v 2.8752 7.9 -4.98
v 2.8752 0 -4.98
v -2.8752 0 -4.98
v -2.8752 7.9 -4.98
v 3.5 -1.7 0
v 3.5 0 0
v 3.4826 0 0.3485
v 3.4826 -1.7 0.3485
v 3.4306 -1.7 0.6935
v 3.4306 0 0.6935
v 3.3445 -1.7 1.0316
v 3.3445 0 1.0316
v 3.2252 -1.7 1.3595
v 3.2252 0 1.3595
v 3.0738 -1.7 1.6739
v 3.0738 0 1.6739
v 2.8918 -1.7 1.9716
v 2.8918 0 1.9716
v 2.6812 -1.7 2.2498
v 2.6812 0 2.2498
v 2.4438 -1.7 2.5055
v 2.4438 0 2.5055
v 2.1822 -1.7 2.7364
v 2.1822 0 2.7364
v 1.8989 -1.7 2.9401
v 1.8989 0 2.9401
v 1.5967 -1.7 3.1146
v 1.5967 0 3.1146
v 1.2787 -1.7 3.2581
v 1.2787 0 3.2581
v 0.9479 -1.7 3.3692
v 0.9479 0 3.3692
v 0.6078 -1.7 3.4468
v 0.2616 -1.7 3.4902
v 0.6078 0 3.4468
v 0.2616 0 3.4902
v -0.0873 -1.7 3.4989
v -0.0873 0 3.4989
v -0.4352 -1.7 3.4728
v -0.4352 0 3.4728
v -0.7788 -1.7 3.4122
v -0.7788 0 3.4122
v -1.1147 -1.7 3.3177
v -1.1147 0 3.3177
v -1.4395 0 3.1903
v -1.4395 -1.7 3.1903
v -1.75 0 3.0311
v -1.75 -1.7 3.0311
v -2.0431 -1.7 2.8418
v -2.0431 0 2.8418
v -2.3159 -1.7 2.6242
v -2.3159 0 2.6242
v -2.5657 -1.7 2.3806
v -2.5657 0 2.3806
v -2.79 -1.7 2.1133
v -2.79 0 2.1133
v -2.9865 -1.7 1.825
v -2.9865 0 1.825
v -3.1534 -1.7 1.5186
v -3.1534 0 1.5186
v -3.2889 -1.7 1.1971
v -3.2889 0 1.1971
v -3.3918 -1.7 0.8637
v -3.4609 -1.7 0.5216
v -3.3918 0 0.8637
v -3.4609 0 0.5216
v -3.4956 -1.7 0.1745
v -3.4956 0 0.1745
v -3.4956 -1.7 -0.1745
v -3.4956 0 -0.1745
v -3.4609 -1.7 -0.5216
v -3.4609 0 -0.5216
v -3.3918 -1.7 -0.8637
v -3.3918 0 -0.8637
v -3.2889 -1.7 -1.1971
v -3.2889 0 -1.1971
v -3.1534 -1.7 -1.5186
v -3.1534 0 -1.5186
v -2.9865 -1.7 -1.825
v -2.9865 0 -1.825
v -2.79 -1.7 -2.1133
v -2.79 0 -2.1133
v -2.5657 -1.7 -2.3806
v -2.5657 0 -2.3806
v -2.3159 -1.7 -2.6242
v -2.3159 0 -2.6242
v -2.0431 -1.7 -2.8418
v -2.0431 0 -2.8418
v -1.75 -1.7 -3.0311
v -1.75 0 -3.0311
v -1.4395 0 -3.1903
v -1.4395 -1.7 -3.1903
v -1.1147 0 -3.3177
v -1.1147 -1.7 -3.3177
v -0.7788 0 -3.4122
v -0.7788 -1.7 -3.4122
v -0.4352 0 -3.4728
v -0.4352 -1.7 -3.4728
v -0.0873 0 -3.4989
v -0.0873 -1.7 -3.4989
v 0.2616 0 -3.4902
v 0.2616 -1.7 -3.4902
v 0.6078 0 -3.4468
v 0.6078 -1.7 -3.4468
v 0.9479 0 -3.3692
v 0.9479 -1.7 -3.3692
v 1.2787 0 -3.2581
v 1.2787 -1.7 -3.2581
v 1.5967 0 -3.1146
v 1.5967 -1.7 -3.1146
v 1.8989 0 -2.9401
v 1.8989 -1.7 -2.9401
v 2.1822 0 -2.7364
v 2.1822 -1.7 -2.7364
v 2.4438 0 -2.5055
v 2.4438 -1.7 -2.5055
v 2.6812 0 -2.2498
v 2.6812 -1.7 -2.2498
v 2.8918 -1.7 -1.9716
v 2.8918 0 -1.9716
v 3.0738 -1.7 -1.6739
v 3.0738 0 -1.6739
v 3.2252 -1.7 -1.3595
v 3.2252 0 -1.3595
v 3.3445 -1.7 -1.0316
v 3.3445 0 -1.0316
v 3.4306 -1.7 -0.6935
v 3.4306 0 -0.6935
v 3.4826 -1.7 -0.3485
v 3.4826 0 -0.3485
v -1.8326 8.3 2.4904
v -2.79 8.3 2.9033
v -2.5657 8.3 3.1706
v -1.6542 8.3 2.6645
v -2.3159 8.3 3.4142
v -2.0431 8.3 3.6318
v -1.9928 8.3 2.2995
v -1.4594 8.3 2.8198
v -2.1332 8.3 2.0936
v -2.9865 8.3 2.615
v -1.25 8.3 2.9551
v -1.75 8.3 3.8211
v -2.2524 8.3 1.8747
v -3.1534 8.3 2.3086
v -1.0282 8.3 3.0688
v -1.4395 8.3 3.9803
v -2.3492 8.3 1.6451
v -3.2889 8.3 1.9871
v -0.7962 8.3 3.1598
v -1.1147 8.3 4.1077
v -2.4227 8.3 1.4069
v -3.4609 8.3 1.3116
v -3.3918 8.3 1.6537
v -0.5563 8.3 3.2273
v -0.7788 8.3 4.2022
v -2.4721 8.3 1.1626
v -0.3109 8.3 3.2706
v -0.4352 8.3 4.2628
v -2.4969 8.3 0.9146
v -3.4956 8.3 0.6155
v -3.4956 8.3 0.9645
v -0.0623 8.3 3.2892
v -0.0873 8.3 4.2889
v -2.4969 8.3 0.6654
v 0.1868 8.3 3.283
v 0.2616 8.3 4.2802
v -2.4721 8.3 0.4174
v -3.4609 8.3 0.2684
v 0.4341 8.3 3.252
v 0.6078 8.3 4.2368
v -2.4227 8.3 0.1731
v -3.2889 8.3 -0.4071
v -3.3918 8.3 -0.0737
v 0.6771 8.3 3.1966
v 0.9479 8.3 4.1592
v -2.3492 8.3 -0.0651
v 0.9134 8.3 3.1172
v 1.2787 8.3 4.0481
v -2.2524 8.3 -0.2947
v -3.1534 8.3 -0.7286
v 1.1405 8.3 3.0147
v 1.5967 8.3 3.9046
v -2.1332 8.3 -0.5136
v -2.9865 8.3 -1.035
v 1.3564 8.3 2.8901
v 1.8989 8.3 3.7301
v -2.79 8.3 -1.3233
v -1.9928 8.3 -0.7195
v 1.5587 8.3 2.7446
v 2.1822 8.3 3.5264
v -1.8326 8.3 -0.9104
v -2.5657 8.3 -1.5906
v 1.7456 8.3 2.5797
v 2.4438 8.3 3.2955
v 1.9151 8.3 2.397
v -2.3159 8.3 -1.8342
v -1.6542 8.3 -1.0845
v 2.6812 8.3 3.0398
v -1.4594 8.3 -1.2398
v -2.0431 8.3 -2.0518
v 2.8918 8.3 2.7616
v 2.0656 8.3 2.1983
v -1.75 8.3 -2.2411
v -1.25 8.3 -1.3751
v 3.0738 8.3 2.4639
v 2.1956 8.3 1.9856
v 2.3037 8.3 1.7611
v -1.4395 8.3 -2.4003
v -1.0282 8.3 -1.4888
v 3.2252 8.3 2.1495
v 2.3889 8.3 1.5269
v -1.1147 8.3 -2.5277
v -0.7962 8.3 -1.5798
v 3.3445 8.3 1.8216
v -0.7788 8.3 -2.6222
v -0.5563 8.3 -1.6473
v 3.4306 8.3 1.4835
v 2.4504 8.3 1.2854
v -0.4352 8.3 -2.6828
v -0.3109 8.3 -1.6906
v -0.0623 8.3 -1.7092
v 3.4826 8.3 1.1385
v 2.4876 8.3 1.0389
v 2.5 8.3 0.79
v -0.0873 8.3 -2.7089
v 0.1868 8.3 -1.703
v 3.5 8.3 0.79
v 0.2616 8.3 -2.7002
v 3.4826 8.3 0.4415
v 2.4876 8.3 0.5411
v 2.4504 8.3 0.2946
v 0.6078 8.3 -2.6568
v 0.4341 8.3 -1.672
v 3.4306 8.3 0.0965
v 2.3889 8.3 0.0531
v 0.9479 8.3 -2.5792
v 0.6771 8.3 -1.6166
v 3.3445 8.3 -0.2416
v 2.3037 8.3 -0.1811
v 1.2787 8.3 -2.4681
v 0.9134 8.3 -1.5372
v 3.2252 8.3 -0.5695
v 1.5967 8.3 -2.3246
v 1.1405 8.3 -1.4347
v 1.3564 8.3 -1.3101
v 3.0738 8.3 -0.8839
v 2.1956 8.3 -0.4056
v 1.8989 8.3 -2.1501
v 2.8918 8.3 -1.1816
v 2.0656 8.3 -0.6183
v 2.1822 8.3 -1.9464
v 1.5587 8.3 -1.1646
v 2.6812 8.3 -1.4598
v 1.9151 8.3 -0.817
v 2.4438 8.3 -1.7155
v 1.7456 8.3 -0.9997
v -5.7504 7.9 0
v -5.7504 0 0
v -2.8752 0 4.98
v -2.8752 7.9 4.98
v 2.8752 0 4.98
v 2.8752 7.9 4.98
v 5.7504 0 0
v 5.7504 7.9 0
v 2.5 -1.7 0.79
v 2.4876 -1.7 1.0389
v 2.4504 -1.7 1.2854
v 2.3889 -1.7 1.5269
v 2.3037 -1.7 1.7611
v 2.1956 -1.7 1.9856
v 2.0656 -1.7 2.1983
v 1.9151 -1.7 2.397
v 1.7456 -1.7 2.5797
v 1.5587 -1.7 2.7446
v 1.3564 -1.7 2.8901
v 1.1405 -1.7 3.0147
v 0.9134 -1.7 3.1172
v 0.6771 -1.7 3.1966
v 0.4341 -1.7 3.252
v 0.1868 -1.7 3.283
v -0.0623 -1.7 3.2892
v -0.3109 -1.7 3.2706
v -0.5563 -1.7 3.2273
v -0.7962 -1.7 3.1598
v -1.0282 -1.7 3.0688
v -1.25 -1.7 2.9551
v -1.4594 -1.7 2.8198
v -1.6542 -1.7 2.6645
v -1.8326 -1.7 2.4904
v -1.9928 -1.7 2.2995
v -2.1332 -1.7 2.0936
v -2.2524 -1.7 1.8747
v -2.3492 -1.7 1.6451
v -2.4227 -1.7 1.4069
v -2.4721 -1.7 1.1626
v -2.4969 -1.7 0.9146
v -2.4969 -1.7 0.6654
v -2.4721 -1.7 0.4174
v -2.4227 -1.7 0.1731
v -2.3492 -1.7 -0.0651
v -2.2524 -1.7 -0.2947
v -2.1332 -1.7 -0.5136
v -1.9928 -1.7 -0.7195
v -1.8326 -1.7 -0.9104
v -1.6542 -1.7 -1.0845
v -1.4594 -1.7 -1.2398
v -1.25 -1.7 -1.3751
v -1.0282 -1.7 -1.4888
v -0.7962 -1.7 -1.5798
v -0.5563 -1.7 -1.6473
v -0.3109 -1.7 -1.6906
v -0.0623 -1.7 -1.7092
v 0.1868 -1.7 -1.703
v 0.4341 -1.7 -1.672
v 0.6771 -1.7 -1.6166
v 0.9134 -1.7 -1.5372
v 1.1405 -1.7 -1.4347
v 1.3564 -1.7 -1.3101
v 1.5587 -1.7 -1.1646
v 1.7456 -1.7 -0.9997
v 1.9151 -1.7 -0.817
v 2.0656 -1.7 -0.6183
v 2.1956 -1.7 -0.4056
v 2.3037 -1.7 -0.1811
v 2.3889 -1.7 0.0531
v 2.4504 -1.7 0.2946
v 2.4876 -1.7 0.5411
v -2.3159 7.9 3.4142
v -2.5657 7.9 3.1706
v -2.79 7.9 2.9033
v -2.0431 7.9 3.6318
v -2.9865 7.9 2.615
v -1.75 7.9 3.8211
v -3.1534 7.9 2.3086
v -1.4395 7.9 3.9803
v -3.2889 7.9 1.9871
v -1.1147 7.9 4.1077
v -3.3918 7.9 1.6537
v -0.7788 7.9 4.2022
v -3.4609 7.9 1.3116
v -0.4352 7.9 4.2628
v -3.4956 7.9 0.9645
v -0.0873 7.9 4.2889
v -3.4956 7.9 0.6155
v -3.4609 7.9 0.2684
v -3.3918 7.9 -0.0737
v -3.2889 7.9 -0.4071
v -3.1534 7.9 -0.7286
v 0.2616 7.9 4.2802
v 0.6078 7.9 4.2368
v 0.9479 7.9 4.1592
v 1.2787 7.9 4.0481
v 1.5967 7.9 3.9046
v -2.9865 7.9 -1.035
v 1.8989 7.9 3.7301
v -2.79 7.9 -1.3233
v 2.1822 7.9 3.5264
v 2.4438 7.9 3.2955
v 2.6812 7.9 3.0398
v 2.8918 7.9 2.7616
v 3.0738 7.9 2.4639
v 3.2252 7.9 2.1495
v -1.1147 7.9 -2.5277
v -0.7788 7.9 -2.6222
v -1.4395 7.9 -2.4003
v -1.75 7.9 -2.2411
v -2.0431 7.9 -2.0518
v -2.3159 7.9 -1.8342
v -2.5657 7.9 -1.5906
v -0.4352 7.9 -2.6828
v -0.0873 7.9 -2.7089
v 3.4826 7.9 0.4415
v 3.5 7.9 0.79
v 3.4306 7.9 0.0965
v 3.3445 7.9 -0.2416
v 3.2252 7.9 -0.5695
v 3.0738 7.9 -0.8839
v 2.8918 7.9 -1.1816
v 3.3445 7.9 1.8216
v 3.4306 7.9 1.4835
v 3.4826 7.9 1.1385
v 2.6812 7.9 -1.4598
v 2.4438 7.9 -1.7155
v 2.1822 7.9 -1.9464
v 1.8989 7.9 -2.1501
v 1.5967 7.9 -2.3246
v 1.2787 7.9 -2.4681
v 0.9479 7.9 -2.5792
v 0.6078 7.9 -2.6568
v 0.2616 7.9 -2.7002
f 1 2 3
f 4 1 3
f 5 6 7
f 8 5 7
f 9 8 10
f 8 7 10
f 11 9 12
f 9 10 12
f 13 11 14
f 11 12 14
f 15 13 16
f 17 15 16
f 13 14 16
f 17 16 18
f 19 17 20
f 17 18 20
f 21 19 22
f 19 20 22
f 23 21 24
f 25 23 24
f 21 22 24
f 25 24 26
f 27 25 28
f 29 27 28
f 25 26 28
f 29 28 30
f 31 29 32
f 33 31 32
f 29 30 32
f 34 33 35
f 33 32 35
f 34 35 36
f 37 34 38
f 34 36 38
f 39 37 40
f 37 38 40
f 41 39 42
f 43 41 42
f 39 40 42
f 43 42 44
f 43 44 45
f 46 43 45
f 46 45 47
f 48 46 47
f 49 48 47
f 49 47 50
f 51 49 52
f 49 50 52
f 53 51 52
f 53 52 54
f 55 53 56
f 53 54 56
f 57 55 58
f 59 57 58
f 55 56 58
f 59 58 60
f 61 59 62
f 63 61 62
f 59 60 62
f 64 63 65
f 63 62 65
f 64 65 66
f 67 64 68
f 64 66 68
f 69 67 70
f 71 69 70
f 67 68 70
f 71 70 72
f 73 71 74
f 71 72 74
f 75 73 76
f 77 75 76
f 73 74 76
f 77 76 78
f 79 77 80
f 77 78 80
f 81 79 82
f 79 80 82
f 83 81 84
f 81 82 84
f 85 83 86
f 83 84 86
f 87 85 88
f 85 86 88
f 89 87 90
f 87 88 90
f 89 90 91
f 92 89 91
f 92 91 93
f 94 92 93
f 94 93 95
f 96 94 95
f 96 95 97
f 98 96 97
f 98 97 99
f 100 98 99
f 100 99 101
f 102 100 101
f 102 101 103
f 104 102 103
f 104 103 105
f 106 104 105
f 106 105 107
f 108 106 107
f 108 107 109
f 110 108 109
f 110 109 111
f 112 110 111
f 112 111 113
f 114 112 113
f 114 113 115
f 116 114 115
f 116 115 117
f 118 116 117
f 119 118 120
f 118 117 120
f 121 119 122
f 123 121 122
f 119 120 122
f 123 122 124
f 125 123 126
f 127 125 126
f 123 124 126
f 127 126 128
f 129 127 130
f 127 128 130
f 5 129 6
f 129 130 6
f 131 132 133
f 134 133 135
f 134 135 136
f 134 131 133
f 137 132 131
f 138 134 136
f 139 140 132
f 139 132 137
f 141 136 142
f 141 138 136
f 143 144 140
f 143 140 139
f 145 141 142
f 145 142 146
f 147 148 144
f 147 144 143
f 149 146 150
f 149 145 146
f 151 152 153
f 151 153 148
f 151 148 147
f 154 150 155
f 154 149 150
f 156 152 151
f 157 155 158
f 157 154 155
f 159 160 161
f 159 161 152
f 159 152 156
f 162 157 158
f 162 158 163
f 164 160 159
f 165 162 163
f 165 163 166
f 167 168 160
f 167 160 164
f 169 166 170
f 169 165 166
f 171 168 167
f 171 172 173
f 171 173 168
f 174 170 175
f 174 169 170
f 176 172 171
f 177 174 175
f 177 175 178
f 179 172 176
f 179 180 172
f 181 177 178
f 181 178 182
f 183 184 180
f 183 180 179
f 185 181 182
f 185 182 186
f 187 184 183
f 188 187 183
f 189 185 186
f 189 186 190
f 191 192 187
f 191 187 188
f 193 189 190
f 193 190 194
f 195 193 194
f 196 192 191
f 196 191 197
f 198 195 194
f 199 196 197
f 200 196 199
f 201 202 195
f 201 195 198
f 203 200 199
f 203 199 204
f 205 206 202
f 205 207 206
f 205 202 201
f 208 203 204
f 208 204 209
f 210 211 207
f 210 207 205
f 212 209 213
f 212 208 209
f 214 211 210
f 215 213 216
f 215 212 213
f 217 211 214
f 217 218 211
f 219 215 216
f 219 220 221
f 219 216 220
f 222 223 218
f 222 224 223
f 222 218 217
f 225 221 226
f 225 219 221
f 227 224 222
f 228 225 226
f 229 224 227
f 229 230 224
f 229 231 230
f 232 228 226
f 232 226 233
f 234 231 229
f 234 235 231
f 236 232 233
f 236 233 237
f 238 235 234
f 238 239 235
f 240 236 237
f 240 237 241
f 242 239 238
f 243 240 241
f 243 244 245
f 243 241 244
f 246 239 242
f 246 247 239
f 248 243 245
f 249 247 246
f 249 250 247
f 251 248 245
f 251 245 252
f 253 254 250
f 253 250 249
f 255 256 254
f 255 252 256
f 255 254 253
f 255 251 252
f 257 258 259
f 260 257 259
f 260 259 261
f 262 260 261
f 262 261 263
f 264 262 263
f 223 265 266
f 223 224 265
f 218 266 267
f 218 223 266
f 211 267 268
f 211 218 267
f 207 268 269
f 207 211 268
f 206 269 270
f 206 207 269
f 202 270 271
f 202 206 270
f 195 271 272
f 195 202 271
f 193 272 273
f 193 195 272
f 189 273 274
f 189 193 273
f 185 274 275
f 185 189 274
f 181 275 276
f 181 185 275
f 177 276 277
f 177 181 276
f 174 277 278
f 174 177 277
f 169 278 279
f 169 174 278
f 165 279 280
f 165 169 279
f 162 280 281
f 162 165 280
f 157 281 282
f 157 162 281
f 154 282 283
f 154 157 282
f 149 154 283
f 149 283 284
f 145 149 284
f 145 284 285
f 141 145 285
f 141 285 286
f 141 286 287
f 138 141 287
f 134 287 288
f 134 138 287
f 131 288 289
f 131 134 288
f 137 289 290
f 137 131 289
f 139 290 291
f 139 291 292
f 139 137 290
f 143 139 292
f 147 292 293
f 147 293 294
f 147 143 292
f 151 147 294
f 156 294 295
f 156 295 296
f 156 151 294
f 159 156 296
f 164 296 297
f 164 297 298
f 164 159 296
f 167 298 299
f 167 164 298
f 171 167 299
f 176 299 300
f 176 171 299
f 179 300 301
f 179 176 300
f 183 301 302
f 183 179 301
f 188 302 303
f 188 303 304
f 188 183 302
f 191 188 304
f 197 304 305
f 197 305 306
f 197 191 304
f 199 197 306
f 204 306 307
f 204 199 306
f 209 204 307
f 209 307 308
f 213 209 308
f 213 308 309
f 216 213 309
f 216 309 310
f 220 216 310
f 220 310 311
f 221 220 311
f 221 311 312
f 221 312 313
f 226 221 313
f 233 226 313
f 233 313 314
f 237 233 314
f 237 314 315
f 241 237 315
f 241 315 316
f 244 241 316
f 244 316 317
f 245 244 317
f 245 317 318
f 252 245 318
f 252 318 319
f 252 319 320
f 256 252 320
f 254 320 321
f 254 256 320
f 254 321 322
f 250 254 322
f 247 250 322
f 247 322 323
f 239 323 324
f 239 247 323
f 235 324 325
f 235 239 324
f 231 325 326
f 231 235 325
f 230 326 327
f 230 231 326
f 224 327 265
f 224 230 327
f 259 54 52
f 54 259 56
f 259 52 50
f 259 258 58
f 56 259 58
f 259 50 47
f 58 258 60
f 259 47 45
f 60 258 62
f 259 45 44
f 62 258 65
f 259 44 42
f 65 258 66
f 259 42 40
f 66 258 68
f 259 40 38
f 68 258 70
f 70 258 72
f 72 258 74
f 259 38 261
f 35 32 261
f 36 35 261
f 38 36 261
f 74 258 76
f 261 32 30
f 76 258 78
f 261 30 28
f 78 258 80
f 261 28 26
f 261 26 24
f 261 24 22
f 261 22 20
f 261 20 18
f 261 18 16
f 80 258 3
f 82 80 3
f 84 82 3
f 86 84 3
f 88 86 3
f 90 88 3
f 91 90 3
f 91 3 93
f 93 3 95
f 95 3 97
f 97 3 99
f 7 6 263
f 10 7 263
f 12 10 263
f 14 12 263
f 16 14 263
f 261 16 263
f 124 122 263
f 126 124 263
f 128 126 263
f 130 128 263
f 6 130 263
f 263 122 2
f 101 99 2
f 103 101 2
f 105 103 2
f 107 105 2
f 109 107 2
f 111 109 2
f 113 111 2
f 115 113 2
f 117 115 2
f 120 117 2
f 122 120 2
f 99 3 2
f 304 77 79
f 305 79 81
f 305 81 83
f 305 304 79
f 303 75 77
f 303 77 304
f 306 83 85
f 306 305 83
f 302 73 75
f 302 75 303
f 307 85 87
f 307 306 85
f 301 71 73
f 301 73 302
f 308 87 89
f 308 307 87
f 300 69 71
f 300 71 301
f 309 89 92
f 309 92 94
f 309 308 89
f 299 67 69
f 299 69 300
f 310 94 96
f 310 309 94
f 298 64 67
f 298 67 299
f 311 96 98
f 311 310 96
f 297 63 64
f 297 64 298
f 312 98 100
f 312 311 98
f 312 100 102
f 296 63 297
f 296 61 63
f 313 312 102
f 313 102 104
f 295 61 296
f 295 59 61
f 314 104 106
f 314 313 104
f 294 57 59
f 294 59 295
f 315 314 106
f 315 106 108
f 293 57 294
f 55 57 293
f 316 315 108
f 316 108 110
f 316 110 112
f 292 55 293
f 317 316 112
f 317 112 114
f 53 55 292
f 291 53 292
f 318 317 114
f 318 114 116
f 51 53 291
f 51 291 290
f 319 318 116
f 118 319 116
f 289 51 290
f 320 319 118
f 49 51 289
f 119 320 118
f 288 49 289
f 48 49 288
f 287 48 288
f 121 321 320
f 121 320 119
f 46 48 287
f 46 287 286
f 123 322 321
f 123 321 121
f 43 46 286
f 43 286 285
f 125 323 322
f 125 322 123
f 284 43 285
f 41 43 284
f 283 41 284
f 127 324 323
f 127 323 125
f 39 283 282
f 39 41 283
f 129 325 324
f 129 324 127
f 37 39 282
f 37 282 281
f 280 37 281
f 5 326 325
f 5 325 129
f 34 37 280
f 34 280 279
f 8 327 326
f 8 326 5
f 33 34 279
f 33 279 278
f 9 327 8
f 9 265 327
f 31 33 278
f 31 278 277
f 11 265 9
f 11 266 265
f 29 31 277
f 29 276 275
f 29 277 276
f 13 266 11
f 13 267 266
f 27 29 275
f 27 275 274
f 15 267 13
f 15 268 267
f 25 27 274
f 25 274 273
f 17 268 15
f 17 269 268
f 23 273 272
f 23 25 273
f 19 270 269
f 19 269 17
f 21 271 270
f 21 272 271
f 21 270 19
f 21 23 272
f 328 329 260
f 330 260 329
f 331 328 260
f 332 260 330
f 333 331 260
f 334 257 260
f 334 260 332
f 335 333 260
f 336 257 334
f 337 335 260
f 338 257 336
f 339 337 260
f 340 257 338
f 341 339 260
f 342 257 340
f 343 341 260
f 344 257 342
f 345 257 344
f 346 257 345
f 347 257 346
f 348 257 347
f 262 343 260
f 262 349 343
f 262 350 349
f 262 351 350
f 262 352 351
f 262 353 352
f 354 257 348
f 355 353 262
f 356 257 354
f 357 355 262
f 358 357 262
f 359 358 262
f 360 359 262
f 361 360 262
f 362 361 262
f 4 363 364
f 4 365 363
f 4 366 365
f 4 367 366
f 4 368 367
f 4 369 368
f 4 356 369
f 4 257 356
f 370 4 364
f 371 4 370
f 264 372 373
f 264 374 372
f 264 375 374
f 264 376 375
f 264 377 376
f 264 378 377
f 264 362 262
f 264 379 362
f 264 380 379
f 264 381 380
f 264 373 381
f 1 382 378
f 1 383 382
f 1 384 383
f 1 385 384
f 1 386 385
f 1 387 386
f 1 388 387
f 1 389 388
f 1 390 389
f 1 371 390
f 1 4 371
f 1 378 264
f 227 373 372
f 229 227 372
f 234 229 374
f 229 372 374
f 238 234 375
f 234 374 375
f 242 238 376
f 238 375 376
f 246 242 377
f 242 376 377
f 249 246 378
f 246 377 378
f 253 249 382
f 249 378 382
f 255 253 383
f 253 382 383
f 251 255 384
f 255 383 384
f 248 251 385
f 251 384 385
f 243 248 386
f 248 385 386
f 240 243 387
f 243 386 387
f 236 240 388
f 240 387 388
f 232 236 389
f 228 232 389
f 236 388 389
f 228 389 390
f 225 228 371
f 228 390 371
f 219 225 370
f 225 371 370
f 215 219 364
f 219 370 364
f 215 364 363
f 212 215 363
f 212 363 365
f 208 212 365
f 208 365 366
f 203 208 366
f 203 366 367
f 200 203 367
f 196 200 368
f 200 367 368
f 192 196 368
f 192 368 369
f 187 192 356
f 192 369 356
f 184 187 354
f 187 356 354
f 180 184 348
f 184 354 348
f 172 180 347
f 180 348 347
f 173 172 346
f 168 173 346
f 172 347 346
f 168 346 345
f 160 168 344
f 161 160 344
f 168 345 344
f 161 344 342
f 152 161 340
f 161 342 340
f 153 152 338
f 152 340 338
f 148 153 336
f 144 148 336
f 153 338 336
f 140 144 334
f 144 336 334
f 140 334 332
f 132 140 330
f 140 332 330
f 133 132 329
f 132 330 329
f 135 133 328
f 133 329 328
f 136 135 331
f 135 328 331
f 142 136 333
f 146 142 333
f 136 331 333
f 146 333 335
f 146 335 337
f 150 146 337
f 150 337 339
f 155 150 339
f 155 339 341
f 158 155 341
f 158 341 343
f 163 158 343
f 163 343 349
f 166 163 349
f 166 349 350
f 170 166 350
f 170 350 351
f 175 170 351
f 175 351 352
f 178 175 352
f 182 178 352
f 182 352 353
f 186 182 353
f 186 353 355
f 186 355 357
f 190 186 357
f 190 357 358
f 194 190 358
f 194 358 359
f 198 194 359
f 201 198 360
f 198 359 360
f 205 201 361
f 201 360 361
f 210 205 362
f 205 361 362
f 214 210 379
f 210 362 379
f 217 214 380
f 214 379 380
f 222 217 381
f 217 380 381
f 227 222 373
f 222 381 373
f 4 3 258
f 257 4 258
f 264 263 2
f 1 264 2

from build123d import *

# Parameters (mm, degrees)
BOSS_EXTRUDE1_DEPTH = 7.9
SKETCH4_R           = 2.5
CUT_EXTRUDE1_DEPTH  = 8.9
SKETCH_1_R          = 3.5
SKETCH_1_R_2        = 2.5
EXTRUDE_1_DEPTH     = 0.4
SKETCH_2_R          = 3.5
SKETCH_2_R_2        = 2.5
EXTRUDE_2_DEPTH     = 1.7


with BuildPart() as part:
    # Sketch1 → Boss-Extrude1 (new body)
    with BuildSketch(Plane(origin=(0, 0, 0), x_dir=(1, 0, 0), z_dir=(0, 1, 0))):
        Polygon((5.750408681, 0), (2.875204341, 4.98), (-2.875204341, 4.98), (-5.750408681, 0), (-2.875204341, -4.98), (2.875204341, -4.98), align=None)
    extrude(amount=BOSS_EXTRUDE1_DEPTH)

    # Sketch4 → Cut-Extrude1 (cut, through all)
    with BuildSketch(Plane(origin=(0, 7.9, 0), x_dir=(1, 0, 0), z_dir=(0, 1, 0))):
        with Locations((0, -0.79)):
            Circle(SKETCH4_R)
    extrude(amount=-CUT_EXTRUDE1_DEPTH, mode=Mode.SUBTRACT)

    # 草图1 → 凸台-拉伸1 (add)
    with BuildSketch(Plane(origin=(0, 7.9, 0), x_dir=(1, 0, 0), z_dir=(0, 1, 0))):
        with Locations((0, -0.79)):
            Circle(SKETCH_1_R)
        with Locations((0, -0.79)):
            Circle(SKETCH_1_R_2, mode=Mode.SUBTRACT)
    extrude(amount=EXTRUDE_1_DEPTH)

    # 草图2 → 凸台-拉伸2 (add)
    with BuildSketch(Plane.XZ):
        Circle(SKETCH_2_R)
        with Locations((0, 0.79)):
            Circle(SKETCH_2_R_2, mode=Mode.SUBTRACT)
    extrude(amount=EXTRUDE_2_DEPTH)


solid = part.part
